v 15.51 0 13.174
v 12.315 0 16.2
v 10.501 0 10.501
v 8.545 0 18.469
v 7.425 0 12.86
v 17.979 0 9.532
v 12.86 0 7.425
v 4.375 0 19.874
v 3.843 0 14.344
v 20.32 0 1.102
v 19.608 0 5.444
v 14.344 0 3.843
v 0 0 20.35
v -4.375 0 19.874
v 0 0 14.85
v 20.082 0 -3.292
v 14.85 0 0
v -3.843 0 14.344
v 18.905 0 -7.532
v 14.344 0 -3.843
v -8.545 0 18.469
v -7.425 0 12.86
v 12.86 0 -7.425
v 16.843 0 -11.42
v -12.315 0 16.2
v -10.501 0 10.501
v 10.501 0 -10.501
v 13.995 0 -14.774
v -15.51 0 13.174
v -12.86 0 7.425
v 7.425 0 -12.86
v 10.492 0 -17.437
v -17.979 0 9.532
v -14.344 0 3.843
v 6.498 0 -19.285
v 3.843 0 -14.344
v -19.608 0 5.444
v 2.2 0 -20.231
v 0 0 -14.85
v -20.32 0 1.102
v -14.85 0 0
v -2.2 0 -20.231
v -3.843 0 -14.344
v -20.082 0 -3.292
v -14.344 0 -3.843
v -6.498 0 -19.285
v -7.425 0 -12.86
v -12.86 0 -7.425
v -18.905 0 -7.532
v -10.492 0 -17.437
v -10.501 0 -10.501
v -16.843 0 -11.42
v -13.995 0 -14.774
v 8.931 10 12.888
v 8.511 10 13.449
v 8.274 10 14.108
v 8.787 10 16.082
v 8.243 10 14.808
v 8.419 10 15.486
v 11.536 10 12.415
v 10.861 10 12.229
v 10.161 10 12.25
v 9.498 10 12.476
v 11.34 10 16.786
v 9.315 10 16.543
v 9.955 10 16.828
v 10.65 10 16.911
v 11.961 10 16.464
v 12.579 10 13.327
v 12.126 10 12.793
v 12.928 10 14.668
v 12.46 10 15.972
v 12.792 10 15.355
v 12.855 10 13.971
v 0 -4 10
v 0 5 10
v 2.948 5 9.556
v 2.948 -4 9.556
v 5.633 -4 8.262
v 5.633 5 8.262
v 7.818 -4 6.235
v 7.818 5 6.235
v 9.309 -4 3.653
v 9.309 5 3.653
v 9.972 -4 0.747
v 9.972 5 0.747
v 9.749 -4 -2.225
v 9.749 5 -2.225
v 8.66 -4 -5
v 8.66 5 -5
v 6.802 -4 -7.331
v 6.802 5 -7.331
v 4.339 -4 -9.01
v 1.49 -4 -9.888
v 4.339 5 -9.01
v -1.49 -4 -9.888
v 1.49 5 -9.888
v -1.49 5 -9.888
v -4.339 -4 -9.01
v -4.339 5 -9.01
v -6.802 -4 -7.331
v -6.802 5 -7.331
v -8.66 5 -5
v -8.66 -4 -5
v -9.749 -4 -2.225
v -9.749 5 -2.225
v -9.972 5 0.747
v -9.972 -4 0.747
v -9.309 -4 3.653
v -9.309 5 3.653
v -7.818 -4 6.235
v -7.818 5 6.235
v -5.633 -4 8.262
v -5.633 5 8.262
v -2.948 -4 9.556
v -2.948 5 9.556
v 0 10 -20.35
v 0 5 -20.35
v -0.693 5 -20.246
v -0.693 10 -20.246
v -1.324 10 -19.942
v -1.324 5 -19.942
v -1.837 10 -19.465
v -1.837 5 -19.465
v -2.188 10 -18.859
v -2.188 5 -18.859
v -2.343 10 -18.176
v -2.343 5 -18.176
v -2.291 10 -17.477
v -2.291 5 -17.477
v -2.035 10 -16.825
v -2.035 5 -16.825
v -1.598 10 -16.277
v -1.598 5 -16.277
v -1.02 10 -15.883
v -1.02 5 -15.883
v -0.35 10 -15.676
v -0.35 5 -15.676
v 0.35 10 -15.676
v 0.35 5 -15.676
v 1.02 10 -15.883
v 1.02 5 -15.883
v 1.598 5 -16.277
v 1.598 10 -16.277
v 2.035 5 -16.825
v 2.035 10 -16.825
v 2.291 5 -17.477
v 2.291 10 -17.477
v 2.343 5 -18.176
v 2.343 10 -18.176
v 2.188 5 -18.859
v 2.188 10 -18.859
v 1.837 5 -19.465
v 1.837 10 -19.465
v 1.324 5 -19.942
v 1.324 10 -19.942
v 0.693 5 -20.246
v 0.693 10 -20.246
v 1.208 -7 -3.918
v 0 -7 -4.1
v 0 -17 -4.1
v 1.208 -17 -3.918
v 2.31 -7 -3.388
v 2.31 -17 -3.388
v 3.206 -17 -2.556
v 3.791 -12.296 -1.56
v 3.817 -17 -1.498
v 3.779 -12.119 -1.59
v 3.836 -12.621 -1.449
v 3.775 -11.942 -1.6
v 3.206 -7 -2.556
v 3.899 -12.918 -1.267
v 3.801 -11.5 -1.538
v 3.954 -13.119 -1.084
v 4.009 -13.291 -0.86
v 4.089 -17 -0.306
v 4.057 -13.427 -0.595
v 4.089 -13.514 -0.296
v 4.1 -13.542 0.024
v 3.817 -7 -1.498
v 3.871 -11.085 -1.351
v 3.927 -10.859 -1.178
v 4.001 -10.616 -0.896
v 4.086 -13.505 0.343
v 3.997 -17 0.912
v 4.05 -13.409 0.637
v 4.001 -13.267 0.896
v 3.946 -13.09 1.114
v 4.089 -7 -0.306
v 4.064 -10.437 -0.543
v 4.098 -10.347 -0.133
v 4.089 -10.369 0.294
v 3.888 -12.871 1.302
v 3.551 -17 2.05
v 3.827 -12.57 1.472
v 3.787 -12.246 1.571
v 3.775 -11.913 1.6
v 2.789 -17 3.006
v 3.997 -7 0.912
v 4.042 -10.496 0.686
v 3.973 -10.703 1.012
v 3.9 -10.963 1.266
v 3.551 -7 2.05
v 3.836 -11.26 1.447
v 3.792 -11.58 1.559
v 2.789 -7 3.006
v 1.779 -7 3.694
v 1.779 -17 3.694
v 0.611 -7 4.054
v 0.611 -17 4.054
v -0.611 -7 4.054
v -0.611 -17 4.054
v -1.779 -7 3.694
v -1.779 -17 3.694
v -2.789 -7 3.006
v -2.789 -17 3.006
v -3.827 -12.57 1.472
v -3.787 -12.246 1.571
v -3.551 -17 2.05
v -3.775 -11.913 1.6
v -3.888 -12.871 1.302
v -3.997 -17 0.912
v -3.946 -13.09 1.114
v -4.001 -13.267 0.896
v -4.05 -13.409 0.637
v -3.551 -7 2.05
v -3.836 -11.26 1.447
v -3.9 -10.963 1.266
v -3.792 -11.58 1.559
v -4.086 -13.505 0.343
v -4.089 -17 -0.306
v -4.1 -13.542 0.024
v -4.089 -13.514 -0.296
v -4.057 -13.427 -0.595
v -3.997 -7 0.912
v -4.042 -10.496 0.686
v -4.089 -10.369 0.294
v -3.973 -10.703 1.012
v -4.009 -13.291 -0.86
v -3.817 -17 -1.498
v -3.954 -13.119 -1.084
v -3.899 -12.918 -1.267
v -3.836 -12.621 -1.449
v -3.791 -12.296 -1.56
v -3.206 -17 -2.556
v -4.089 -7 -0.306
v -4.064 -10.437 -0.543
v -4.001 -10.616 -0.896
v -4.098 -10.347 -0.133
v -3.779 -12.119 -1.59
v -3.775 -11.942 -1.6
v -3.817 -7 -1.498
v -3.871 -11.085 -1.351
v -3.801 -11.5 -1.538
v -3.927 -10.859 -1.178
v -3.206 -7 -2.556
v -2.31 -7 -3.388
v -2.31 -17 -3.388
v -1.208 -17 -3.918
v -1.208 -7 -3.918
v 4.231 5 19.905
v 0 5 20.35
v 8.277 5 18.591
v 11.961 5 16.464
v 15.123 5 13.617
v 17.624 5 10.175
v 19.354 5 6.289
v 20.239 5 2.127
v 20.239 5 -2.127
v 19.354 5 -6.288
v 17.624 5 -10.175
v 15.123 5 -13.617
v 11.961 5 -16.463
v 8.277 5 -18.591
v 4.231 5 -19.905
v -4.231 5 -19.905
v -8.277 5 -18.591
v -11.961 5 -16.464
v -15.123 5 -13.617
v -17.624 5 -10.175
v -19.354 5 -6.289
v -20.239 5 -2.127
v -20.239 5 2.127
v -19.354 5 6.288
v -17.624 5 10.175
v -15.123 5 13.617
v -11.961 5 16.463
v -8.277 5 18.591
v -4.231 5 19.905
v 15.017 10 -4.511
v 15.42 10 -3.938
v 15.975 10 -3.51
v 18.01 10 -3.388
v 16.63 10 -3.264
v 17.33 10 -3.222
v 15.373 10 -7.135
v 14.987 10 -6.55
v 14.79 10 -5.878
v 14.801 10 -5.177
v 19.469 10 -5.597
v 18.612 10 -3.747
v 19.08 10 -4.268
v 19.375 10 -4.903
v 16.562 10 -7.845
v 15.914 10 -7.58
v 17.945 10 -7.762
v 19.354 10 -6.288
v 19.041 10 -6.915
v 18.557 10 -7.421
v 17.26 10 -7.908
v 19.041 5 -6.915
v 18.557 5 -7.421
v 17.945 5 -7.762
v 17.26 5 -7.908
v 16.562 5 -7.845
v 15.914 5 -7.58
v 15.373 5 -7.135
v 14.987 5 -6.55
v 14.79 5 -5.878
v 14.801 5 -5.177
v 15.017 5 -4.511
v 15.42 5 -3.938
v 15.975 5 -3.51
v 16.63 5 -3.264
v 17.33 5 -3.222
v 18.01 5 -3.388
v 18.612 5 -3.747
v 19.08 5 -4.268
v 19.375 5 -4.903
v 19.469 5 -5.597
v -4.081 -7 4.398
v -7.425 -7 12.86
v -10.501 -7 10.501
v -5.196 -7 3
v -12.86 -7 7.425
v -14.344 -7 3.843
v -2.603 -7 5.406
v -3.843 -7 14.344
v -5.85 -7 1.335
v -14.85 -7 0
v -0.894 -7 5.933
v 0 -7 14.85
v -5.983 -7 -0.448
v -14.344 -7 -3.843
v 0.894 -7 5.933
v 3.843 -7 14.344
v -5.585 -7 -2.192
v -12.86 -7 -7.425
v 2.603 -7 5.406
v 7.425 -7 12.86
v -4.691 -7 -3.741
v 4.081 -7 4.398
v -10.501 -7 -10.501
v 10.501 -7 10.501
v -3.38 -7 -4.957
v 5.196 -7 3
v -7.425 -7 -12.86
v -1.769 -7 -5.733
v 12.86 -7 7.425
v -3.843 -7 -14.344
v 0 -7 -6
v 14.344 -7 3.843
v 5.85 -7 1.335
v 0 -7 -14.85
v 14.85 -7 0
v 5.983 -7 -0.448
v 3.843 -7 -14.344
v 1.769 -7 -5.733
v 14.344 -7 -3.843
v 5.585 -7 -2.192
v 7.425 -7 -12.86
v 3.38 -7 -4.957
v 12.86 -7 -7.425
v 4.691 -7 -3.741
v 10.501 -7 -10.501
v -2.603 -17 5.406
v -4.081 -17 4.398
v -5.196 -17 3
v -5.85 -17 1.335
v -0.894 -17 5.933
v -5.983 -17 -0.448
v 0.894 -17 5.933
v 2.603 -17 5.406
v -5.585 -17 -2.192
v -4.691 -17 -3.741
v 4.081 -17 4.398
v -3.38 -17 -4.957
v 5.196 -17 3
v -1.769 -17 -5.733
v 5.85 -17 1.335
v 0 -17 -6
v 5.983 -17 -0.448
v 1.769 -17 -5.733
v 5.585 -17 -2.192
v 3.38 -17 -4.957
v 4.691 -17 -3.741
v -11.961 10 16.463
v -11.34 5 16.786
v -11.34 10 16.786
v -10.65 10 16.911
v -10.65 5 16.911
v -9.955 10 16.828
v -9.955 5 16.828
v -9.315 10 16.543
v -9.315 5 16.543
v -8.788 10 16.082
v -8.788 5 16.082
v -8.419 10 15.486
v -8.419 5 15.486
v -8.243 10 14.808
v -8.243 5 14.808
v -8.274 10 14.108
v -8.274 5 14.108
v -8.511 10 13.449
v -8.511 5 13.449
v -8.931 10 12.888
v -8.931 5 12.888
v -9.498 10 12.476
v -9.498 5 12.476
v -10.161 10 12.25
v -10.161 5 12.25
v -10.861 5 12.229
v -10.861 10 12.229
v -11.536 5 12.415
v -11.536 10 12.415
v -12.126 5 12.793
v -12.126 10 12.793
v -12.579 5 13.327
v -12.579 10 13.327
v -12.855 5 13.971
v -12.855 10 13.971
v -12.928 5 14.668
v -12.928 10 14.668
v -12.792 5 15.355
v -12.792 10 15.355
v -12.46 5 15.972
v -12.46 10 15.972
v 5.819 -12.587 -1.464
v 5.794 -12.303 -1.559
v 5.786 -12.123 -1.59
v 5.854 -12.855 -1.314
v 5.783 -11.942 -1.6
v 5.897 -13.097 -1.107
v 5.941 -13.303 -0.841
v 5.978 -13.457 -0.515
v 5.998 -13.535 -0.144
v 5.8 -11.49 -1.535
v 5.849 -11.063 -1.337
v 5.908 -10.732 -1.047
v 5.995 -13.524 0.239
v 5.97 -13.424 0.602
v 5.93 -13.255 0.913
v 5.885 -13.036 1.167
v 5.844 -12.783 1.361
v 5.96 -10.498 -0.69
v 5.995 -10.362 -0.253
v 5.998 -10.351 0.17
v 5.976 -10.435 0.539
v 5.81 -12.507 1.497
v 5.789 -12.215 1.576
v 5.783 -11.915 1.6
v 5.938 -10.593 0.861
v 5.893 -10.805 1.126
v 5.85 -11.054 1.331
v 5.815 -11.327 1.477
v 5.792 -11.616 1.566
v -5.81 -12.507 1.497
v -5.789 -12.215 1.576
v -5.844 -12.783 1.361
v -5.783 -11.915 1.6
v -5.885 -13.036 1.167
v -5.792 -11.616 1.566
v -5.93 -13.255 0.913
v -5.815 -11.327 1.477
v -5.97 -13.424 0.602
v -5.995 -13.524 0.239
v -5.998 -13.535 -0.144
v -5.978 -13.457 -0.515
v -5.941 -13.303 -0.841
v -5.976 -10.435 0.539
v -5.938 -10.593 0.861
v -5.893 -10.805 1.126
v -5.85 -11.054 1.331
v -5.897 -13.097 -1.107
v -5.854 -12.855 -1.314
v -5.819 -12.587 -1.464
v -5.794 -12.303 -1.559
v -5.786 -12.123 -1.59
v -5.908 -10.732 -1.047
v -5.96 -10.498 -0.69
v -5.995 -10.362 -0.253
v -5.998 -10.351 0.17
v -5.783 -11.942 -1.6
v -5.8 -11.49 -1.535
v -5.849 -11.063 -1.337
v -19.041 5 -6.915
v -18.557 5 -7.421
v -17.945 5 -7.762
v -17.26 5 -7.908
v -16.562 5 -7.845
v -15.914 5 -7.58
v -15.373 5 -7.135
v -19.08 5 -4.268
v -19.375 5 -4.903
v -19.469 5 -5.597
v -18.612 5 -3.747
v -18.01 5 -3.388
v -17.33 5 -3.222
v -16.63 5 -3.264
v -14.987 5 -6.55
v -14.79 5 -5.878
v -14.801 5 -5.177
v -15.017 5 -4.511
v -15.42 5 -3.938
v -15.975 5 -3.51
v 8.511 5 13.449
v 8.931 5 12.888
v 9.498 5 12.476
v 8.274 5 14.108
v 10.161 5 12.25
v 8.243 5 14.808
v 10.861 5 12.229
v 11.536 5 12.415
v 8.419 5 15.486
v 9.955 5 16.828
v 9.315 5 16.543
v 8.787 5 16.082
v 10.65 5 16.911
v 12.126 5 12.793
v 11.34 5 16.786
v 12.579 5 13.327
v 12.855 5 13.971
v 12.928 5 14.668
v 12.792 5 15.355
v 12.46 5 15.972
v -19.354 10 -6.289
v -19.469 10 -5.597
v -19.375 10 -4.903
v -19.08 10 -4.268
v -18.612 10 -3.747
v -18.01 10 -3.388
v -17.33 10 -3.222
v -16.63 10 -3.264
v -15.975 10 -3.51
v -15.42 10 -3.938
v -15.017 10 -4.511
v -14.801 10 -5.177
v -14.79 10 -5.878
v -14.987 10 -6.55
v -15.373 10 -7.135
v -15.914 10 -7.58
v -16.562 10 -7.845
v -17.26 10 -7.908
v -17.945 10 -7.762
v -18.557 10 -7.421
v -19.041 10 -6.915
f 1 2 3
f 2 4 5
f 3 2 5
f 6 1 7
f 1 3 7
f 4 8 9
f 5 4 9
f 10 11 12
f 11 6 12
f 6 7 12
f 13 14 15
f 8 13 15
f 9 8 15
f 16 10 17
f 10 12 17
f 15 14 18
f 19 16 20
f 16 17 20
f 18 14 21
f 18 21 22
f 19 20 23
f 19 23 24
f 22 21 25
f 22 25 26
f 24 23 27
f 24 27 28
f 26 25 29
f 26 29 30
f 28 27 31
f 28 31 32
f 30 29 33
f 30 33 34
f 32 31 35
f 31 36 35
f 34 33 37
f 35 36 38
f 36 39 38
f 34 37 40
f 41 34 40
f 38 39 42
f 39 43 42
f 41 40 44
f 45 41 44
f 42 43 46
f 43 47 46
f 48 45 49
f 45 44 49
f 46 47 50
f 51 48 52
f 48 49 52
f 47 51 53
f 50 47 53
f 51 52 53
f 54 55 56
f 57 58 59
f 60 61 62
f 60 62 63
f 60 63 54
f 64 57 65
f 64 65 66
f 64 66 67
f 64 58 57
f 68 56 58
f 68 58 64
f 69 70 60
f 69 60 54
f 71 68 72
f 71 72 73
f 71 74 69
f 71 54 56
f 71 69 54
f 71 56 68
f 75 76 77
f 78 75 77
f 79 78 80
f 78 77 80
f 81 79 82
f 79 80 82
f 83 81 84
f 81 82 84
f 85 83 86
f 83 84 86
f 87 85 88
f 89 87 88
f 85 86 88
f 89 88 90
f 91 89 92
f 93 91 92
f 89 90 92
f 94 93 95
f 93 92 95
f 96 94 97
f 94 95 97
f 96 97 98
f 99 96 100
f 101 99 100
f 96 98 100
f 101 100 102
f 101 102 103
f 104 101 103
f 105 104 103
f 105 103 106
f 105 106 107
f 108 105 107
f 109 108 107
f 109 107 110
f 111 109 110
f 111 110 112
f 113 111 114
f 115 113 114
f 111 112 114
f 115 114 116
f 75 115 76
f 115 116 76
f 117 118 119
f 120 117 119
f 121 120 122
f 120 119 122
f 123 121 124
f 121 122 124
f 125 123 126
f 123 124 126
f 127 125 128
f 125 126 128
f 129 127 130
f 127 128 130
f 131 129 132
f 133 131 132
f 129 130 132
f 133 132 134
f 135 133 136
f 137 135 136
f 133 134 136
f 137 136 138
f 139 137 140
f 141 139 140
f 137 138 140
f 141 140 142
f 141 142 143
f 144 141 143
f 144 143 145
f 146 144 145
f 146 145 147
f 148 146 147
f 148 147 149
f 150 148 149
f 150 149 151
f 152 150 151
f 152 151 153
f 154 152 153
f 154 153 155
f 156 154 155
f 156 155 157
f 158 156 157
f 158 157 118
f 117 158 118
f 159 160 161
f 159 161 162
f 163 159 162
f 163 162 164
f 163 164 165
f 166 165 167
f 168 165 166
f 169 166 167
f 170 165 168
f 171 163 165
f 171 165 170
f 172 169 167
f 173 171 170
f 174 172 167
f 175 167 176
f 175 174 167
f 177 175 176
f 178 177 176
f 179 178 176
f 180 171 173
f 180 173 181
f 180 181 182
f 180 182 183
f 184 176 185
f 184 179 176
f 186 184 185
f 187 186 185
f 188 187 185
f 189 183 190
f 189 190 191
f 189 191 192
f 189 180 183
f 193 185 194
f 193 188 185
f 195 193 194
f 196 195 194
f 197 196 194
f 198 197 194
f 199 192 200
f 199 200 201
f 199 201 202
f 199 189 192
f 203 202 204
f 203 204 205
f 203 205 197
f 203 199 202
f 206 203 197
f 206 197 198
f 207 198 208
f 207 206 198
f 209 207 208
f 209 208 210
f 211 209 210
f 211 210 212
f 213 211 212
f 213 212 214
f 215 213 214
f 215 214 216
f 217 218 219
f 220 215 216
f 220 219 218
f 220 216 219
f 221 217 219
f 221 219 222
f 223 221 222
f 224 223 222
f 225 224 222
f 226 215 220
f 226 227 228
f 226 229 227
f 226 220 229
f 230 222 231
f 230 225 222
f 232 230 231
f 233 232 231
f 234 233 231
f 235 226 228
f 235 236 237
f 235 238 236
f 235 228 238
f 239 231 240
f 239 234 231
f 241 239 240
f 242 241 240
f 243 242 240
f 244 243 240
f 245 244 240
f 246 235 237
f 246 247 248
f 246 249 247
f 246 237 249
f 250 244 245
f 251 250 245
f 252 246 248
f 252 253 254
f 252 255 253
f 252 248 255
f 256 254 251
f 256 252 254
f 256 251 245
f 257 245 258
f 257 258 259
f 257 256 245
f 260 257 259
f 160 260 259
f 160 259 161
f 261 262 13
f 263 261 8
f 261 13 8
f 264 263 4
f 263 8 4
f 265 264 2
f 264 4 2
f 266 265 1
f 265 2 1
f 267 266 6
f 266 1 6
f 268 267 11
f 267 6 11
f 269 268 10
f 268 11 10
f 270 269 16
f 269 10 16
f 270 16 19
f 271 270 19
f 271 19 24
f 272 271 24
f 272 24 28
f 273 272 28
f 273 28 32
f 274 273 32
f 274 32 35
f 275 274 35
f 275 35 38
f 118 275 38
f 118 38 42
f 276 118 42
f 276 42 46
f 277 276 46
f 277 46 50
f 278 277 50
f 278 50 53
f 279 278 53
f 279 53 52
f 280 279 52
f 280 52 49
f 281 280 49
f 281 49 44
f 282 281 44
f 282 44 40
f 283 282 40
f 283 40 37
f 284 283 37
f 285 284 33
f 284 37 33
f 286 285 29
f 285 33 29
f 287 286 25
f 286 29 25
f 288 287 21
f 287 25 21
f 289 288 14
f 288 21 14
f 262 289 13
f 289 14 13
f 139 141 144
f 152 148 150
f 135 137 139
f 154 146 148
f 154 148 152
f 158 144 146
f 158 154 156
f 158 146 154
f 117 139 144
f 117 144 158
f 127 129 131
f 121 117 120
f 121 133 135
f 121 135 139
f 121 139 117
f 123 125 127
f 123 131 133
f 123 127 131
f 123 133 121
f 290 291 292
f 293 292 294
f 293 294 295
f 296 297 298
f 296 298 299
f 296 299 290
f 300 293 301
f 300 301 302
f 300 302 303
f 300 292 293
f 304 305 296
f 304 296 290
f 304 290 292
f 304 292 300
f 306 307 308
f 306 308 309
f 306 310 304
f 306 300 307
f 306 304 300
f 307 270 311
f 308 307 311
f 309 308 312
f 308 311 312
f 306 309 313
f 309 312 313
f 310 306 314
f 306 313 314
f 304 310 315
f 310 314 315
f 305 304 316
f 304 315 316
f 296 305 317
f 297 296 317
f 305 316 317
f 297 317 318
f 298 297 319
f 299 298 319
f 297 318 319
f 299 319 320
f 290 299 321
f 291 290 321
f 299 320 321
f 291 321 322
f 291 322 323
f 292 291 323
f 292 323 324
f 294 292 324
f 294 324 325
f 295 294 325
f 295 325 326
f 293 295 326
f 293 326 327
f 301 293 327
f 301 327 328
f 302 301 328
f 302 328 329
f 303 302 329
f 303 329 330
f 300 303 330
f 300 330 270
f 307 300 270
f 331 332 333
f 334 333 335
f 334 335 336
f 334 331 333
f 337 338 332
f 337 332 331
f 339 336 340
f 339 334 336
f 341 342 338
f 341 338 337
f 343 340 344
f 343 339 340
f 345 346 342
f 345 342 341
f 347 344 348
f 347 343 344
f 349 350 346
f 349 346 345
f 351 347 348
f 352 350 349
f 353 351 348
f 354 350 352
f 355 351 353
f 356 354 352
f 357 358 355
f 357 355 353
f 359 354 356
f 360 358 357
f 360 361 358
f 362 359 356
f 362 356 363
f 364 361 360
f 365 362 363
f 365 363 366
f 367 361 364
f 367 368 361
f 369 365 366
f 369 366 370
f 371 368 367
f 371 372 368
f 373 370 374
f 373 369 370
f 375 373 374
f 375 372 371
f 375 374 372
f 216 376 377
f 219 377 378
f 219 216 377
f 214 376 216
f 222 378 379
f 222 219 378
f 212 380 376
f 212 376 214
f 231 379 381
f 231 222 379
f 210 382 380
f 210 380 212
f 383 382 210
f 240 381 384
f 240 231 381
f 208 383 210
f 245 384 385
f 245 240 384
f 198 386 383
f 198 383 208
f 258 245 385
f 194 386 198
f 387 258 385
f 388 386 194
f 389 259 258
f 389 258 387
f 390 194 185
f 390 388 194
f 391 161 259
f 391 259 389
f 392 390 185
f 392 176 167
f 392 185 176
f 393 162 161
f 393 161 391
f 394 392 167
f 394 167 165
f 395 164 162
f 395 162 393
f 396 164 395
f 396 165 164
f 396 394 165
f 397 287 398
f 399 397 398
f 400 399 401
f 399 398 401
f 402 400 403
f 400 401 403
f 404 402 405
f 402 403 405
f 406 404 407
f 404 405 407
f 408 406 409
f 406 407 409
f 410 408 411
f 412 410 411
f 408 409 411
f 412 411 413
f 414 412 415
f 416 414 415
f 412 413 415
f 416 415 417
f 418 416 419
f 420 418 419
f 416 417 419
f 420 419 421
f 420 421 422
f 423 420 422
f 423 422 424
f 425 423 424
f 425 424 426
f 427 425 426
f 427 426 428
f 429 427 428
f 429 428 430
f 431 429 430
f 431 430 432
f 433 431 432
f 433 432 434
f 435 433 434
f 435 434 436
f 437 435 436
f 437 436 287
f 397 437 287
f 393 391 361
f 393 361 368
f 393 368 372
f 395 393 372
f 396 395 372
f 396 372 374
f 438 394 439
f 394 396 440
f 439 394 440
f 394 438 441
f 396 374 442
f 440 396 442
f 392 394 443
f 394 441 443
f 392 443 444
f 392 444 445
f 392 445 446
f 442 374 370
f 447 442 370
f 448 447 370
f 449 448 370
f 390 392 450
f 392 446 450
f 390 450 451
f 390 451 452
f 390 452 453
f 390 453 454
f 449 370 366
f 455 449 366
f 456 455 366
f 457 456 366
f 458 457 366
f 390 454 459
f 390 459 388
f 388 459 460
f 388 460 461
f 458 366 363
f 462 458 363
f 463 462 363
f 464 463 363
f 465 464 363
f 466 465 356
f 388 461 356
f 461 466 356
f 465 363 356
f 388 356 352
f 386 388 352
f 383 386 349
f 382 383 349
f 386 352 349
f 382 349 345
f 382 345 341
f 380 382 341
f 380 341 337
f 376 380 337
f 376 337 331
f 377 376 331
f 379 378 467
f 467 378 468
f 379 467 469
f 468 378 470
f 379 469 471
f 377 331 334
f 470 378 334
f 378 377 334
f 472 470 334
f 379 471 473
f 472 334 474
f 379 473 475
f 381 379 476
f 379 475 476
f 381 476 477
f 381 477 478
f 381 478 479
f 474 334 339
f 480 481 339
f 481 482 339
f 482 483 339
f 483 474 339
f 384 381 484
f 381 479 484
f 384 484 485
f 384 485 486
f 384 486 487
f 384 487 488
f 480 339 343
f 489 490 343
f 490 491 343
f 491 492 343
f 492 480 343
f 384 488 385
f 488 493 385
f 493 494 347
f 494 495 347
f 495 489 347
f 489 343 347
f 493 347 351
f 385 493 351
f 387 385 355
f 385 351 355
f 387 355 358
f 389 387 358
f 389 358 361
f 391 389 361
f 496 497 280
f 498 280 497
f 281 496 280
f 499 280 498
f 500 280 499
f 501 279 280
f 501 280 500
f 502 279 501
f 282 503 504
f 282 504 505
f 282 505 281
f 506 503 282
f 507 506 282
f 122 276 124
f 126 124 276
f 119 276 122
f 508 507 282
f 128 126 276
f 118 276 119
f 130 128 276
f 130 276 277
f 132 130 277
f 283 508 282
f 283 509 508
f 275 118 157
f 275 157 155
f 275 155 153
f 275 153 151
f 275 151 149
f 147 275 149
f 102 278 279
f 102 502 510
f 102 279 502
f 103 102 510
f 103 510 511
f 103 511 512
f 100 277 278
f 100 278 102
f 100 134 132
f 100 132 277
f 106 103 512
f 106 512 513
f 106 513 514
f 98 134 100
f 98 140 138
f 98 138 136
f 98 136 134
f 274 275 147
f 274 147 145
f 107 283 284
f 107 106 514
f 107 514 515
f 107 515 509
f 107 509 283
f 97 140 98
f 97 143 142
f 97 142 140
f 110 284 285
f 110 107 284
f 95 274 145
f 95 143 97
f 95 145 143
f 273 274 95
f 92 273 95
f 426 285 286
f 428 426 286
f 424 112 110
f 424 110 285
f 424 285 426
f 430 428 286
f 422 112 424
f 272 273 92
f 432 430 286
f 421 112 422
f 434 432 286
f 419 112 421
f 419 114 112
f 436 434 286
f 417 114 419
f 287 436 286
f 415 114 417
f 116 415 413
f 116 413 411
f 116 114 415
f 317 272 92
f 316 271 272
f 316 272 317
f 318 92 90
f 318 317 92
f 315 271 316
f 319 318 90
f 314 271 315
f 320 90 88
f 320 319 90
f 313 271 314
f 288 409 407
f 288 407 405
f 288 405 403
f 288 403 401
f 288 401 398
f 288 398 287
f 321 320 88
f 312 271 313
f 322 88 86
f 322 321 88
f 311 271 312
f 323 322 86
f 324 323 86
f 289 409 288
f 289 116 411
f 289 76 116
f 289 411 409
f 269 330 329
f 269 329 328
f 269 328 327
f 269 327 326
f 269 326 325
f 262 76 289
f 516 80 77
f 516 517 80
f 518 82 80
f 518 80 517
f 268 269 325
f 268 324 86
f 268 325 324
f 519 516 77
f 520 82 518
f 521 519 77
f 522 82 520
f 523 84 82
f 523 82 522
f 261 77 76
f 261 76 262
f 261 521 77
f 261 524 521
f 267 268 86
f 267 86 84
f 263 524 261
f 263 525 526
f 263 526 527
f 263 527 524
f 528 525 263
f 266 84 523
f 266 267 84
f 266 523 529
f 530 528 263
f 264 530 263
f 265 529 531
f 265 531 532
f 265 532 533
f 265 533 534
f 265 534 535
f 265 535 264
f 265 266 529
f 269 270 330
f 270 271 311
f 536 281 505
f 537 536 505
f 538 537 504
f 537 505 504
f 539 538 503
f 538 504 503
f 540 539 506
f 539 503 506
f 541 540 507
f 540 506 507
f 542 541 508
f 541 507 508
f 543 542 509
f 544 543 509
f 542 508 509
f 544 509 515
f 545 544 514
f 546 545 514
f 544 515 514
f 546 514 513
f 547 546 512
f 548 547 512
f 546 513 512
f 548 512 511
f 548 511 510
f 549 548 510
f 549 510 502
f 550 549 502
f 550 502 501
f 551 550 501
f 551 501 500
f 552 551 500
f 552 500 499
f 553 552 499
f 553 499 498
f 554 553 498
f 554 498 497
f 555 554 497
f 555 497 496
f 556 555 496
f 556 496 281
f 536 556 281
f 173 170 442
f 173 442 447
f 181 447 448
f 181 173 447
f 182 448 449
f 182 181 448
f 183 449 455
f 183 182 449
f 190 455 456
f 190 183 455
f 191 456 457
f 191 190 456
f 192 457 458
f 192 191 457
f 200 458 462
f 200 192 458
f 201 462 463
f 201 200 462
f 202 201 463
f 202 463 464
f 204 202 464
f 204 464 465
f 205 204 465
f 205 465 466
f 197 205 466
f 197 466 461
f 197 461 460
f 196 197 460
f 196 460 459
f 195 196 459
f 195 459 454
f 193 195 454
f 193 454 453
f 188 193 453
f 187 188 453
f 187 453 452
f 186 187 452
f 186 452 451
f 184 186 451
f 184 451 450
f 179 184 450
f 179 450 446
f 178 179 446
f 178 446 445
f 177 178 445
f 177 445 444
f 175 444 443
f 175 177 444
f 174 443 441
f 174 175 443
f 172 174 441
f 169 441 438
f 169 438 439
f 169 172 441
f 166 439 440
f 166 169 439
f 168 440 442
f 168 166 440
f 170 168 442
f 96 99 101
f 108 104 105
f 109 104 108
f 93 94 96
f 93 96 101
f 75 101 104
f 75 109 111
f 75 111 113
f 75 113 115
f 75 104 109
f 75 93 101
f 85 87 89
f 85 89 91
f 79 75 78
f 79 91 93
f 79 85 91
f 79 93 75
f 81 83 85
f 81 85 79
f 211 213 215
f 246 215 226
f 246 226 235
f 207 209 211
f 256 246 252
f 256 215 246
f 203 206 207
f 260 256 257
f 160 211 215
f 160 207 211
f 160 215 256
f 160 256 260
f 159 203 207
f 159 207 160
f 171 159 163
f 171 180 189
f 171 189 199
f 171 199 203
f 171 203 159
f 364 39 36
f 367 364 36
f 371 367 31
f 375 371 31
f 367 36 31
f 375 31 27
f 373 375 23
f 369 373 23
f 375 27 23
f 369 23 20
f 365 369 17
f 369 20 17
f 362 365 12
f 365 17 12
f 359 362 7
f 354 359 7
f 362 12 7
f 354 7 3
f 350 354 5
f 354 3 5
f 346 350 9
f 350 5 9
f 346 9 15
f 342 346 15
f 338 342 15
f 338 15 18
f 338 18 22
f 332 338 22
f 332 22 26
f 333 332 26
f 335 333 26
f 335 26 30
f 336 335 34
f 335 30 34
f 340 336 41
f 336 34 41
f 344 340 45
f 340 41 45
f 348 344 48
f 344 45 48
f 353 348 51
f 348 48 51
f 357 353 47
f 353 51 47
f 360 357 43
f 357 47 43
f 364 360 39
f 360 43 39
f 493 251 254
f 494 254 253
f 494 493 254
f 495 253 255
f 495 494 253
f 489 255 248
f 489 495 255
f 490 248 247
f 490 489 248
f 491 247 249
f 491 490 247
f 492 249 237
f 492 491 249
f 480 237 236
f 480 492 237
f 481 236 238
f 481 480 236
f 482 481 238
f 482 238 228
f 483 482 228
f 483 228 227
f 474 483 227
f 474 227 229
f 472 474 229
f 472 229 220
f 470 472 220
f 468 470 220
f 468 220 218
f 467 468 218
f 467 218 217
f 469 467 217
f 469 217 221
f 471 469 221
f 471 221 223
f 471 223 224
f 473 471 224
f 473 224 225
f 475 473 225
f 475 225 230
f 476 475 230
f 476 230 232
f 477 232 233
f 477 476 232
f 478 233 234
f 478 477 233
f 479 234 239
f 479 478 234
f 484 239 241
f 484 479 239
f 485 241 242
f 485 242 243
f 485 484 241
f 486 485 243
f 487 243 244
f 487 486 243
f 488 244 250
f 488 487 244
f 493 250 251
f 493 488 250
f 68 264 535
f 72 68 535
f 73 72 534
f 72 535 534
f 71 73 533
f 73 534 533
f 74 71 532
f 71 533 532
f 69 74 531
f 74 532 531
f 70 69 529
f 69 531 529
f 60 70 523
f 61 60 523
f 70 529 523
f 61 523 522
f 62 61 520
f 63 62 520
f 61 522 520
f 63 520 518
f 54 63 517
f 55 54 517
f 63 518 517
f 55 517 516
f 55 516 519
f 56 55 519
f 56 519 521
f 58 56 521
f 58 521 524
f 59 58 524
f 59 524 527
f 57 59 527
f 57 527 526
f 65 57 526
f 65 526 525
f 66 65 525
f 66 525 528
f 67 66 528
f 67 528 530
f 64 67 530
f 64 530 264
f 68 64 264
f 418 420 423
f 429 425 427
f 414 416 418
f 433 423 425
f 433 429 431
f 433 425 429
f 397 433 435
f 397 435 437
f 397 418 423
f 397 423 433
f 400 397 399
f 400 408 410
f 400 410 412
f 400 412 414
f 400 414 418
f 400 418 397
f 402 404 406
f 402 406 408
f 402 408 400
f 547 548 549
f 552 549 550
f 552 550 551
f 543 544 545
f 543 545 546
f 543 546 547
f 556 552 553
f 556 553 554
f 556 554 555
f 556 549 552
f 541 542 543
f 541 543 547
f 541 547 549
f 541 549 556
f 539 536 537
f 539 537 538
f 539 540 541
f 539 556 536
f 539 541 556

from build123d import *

# Parameters (mm, degrees)
SKETCH1_R               = 20.35
BOSS_EXTRUDE2_DEPTH     = 5
SKETCH1_3_R             = 2.35
BOSS_EXTRUDE3_DEPTH     = 10
SKETCH2_R               = 14.85
BOSS_EXTRUDE4_DEPTH     = 7
SKETCH3_R               = 6
SKETCH3_R_2             = 4.1
BOSS_EXTRUDE5_DEPTH     = 10
CUT_EXTRUDE1_DEPTH      = 34.425215033
CUT_EXTRUDE1_DEPTH_BACK = 34.425215033
SKETCH5_R               = 1.6
SKETCH6_R               = 10
CUT_EXTRUDE2_DEPTH      = 9


with BuildPart() as part:
    # Sketch1 → Boss-Extrude2 (new body)
    with BuildSketch(Plane(origin=(0, 0, 0), x_dir=(1, 0, 0), z_dir=(0, 1, 0))):
        Circle(SKETCH1_R)
    extrude(amount=BOSS_EXTRUDE2_DEPTH)

    # Sketch1<3> → Boss-Extrude3 (add)
    with BuildSketch(Plane(origin=(0, 0, 0), x_dir=(1, 0, 0), z_dir=(0, 1, 0))):
        with Locations((0, 18)):
            Circle(SKETCH1_3_R)
        with Locations((-17.119017293, 5.562305899)):
            Circle(SKETCH1_3_R)
        with Locations((-10.580134541, -14.562305899)):
            Circle(SKETCH1_3_R)
        with Locations((10.580134541, -14.562305899)):
            Circle(SKETCH1_3_R)
        with Locations((17.119017293, 5.562305899)):
            Circle(SKETCH1_3_R)
    extrude(amount=BOSS_EXTRUDE3_DEPTH)

    # Sketch2 → Boss-Extrude4 (add)
    with BuildSketch(Plane.XZ):
        Circle(SKETCH2_R)
    extrude(amount=BOSS_EXTRUDE4_DEPTH)

    # Sketch3 → Boss-Extrude5 (add)
    with BuildSketch(Plane.XZ.offset(7)):
        Circle(SKETCH3_R)
        Circle(SKETCH3_R_2, mode=Mode.SUBTRACT)
    extrude(amount=BOSS_EXTRUDE5_DEPTH)

    # Sketch5 → Cut-Extrude1 (cut, two sides: drawn at the far end of the back side and taken through both)
    with BuildSketch(Plane(origin=(0, 0, 0), x_dir=(0, 0, -1), z_dir=(1, 0, 0)).offset(-CUT_EXTRUDE1_DEPTH_BACK)):
        with Locations((0, -11.941738225)):
            Circle(SKETCH5_R)
    extrude(amount=CUT_EXTRUDE1_DEPTH + CUT_EXTRUDE1_DEPTH_BACK, mode=Mode.SUBTRACT)

    # Sketch6 → Cut-Extrude2 (cut)
    with BuildSketch(Plane(origin=(0, 5, 0), x_dir=(1, 0, 0), z_dir=(0, 1, 0))):
        Circle(SKETCH6_R)
    extrude(amount=-CUT_EXTRUDE2_DEPTH, mode=Mode.SUBTRACT)


solid = part.part
